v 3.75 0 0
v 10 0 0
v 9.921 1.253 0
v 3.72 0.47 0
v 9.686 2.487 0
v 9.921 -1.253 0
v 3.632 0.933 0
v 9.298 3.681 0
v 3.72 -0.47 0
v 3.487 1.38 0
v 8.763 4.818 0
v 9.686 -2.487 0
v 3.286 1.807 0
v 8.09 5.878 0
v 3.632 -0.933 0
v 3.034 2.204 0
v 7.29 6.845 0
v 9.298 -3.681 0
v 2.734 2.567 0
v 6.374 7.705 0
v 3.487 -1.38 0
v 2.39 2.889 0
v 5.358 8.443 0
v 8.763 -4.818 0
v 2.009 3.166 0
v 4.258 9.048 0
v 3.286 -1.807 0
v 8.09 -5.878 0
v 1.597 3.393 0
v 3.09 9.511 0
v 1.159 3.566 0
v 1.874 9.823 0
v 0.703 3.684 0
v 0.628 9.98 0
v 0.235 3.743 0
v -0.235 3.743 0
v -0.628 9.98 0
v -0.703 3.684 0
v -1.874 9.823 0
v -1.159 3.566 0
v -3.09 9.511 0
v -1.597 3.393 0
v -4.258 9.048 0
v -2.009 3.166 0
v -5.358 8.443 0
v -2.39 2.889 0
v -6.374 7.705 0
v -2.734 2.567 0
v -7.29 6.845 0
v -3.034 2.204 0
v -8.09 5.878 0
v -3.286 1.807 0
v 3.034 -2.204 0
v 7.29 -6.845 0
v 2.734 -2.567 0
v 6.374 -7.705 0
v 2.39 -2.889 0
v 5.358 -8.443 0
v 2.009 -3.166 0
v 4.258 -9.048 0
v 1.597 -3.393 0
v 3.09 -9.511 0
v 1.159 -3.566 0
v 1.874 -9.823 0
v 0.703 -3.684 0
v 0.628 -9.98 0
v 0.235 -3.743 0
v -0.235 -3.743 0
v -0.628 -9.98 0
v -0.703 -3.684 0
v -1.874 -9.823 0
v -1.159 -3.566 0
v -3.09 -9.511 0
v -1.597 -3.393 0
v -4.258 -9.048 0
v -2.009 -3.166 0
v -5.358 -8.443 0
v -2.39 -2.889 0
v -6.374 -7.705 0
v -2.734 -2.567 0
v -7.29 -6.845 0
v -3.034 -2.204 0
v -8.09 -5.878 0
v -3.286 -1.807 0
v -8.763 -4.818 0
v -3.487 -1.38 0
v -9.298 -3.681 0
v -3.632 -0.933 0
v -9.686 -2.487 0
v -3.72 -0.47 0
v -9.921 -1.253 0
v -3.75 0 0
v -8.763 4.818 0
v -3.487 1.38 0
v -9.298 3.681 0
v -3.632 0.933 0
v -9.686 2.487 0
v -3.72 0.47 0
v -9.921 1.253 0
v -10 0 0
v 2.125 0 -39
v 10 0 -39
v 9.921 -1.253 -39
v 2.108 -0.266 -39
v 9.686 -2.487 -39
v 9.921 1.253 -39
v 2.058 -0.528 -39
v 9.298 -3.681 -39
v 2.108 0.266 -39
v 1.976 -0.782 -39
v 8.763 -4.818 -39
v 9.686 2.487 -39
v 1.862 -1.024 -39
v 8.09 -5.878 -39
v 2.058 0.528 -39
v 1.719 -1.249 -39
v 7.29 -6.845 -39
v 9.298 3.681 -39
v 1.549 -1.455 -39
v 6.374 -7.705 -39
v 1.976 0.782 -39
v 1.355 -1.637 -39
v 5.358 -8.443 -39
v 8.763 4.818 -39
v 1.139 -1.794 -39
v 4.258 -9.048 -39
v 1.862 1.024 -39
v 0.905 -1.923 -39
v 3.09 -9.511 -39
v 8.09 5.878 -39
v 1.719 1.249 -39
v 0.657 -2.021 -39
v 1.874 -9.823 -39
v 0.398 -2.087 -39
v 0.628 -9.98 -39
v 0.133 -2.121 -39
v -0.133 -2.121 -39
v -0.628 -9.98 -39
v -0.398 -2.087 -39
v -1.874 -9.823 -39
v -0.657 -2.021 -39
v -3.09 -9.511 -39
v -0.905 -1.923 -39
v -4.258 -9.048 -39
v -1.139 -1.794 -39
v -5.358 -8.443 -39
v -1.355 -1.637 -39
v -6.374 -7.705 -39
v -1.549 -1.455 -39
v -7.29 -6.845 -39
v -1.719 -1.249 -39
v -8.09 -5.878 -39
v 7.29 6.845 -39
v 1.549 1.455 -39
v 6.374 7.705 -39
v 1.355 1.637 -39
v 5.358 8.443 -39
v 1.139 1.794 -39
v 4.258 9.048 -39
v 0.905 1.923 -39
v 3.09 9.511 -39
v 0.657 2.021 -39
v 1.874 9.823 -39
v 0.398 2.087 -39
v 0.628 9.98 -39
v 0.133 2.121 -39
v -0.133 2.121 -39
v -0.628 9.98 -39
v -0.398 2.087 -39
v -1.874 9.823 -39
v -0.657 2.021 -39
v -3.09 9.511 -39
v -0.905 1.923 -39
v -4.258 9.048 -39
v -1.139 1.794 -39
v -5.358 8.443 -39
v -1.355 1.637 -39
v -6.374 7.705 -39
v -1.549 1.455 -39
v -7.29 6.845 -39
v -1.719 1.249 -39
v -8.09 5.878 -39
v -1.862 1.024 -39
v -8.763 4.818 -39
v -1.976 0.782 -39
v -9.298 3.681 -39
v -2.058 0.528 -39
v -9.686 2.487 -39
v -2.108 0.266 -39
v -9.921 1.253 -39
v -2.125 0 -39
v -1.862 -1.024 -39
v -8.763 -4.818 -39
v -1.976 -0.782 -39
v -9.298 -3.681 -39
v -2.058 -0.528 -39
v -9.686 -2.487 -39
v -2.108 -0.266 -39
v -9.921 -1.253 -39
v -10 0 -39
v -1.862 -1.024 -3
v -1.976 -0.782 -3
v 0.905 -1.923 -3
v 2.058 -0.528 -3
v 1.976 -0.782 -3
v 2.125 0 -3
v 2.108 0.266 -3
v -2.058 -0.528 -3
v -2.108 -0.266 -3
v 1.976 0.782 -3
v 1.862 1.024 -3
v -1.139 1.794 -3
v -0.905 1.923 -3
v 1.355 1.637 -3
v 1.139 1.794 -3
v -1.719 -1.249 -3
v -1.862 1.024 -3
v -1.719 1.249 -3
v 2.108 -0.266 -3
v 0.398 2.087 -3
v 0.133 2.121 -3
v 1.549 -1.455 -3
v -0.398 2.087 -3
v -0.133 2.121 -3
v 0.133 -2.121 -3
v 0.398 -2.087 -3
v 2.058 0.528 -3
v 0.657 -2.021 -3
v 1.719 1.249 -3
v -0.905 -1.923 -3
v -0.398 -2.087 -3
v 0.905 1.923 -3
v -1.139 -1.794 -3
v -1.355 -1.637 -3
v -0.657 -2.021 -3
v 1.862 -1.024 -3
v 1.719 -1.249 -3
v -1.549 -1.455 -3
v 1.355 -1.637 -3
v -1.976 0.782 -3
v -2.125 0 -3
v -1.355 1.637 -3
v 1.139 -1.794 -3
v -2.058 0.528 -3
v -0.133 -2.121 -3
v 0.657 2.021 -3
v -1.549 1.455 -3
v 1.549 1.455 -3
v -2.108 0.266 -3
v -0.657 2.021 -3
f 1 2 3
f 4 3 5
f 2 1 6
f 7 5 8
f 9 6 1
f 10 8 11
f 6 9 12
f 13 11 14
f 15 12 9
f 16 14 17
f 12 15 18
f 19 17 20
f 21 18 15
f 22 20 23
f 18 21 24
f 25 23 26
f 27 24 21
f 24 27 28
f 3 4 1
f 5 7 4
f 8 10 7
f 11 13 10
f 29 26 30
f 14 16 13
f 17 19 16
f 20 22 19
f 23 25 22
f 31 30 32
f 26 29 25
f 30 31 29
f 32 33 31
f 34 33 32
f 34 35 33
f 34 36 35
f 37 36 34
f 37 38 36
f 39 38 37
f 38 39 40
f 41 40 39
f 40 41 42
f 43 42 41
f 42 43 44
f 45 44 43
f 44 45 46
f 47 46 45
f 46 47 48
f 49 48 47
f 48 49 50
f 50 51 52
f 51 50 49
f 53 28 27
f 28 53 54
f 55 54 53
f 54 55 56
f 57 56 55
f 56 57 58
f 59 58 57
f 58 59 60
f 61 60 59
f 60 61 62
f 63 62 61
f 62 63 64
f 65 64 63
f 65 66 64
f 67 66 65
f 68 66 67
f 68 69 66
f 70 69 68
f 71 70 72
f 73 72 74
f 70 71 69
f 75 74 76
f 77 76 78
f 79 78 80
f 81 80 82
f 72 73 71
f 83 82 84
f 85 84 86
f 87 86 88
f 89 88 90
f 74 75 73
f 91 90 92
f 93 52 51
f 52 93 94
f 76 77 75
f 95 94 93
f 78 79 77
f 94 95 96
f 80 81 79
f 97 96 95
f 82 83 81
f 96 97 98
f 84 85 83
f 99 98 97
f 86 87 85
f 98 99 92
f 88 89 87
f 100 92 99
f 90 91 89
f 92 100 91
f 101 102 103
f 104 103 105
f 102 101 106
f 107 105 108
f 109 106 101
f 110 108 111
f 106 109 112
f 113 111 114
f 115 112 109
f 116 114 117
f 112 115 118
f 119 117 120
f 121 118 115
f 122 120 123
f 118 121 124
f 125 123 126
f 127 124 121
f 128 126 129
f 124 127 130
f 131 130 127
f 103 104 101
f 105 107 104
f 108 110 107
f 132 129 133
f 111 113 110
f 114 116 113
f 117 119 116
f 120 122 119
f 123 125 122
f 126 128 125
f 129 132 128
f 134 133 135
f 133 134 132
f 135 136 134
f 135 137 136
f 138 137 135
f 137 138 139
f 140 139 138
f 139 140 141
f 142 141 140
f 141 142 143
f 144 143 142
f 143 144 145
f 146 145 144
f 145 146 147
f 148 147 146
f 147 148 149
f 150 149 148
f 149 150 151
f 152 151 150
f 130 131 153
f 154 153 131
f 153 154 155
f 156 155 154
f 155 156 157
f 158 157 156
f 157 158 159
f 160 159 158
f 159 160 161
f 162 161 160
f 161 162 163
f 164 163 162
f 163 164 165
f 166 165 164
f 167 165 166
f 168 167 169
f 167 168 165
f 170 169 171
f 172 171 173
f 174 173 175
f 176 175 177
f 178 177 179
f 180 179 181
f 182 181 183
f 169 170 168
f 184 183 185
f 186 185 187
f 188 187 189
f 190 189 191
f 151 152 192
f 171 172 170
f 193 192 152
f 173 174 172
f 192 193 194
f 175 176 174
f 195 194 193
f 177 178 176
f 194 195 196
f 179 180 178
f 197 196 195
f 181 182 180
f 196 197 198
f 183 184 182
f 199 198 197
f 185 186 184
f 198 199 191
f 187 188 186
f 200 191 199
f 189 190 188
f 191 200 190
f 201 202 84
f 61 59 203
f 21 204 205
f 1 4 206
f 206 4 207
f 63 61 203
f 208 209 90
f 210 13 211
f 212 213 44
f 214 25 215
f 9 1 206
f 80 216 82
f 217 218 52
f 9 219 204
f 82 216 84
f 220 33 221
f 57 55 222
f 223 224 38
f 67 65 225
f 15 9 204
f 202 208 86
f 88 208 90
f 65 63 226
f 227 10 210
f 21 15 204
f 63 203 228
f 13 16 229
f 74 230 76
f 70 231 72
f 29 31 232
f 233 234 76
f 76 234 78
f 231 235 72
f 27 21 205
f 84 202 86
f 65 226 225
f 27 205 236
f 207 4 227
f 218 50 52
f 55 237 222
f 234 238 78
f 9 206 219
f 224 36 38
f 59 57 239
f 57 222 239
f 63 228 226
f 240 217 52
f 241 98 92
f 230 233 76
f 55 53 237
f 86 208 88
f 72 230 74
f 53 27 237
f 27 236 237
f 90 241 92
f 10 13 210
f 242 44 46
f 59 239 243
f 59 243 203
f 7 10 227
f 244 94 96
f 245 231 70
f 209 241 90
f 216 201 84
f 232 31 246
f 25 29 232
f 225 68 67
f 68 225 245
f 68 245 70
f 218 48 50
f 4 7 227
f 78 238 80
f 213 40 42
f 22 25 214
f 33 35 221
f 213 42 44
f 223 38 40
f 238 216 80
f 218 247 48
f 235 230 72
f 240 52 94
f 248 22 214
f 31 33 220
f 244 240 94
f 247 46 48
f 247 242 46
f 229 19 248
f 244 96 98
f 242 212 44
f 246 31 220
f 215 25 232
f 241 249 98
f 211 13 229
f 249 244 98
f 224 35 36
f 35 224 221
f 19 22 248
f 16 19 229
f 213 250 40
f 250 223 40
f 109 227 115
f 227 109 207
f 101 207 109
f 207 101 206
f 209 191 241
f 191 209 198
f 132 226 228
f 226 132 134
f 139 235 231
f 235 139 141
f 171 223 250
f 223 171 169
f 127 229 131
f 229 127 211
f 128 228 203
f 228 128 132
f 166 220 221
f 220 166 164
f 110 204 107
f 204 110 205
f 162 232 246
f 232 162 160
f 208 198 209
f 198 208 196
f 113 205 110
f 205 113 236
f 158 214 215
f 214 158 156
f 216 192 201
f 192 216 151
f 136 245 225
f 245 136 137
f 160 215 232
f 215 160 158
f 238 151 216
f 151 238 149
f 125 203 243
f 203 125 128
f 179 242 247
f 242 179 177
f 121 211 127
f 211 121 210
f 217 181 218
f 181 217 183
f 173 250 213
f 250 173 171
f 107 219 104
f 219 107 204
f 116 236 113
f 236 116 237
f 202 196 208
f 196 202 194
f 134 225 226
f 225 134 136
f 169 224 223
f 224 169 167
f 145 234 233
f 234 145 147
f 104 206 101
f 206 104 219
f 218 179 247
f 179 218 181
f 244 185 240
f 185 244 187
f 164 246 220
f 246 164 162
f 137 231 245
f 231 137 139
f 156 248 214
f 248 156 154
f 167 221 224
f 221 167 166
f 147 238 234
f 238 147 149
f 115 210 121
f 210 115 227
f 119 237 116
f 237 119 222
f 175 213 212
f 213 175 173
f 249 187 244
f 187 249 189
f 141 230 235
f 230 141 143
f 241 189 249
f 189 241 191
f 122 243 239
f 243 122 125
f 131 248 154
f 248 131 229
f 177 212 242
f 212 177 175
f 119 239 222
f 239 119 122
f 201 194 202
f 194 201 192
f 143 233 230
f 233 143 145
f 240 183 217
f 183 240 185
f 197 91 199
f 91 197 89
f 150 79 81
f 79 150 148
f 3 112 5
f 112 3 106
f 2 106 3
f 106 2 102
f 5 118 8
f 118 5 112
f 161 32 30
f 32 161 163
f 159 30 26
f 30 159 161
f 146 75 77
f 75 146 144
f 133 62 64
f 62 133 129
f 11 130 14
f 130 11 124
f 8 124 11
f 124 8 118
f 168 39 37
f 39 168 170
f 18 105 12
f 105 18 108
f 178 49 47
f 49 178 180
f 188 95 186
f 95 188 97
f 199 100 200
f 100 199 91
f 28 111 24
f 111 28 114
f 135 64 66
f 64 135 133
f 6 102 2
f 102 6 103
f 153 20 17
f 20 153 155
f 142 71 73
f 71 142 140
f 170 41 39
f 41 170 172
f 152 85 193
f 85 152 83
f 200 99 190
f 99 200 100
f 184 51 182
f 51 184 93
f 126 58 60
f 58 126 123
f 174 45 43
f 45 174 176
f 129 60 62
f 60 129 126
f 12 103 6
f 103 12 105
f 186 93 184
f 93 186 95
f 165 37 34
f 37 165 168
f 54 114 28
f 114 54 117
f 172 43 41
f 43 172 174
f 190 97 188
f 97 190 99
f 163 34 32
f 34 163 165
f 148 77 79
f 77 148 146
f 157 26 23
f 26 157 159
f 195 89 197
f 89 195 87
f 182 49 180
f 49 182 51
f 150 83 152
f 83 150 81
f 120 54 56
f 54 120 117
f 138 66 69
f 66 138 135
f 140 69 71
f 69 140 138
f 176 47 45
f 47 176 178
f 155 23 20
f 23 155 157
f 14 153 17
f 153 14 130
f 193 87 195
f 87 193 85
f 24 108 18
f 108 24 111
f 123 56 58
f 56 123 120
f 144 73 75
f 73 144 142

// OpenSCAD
$fn = 50;


difference() {
	union() {
		translate(v = [0, 0, -39.0000000000]) {
			cylinder(h = 39, r = 10.0000000000);
		}
		cylinder(h = 0, r = 16.0000000000);
	}
	union() {
		translate(v = [0, 0, 0]) {
			rotate(a = [0, 0, 0]) {
				difference() {
					union() {
						#translate(v = [0, 0, -39.0000000000]) {
							cylinder(h = 39, r = 2.0000000000);
						}
						#translate(v = [0, 0, -3]) {
							cylinder(h = 3, r = 10.0000000000, r1 = 2.1250000000, r2 = 3.7500000000);
						}
						#translate(v = [0, 0, -39.0000000000]) {
							cylinder(h = 39, r = 2.1250000000);
						}
						#translate(v = [0, 0, -39.0000000000]) {
							cylinder(h = 39, r = 2.0000000000);
						}
					}
					union();
				}
			}
		}
	}
}
